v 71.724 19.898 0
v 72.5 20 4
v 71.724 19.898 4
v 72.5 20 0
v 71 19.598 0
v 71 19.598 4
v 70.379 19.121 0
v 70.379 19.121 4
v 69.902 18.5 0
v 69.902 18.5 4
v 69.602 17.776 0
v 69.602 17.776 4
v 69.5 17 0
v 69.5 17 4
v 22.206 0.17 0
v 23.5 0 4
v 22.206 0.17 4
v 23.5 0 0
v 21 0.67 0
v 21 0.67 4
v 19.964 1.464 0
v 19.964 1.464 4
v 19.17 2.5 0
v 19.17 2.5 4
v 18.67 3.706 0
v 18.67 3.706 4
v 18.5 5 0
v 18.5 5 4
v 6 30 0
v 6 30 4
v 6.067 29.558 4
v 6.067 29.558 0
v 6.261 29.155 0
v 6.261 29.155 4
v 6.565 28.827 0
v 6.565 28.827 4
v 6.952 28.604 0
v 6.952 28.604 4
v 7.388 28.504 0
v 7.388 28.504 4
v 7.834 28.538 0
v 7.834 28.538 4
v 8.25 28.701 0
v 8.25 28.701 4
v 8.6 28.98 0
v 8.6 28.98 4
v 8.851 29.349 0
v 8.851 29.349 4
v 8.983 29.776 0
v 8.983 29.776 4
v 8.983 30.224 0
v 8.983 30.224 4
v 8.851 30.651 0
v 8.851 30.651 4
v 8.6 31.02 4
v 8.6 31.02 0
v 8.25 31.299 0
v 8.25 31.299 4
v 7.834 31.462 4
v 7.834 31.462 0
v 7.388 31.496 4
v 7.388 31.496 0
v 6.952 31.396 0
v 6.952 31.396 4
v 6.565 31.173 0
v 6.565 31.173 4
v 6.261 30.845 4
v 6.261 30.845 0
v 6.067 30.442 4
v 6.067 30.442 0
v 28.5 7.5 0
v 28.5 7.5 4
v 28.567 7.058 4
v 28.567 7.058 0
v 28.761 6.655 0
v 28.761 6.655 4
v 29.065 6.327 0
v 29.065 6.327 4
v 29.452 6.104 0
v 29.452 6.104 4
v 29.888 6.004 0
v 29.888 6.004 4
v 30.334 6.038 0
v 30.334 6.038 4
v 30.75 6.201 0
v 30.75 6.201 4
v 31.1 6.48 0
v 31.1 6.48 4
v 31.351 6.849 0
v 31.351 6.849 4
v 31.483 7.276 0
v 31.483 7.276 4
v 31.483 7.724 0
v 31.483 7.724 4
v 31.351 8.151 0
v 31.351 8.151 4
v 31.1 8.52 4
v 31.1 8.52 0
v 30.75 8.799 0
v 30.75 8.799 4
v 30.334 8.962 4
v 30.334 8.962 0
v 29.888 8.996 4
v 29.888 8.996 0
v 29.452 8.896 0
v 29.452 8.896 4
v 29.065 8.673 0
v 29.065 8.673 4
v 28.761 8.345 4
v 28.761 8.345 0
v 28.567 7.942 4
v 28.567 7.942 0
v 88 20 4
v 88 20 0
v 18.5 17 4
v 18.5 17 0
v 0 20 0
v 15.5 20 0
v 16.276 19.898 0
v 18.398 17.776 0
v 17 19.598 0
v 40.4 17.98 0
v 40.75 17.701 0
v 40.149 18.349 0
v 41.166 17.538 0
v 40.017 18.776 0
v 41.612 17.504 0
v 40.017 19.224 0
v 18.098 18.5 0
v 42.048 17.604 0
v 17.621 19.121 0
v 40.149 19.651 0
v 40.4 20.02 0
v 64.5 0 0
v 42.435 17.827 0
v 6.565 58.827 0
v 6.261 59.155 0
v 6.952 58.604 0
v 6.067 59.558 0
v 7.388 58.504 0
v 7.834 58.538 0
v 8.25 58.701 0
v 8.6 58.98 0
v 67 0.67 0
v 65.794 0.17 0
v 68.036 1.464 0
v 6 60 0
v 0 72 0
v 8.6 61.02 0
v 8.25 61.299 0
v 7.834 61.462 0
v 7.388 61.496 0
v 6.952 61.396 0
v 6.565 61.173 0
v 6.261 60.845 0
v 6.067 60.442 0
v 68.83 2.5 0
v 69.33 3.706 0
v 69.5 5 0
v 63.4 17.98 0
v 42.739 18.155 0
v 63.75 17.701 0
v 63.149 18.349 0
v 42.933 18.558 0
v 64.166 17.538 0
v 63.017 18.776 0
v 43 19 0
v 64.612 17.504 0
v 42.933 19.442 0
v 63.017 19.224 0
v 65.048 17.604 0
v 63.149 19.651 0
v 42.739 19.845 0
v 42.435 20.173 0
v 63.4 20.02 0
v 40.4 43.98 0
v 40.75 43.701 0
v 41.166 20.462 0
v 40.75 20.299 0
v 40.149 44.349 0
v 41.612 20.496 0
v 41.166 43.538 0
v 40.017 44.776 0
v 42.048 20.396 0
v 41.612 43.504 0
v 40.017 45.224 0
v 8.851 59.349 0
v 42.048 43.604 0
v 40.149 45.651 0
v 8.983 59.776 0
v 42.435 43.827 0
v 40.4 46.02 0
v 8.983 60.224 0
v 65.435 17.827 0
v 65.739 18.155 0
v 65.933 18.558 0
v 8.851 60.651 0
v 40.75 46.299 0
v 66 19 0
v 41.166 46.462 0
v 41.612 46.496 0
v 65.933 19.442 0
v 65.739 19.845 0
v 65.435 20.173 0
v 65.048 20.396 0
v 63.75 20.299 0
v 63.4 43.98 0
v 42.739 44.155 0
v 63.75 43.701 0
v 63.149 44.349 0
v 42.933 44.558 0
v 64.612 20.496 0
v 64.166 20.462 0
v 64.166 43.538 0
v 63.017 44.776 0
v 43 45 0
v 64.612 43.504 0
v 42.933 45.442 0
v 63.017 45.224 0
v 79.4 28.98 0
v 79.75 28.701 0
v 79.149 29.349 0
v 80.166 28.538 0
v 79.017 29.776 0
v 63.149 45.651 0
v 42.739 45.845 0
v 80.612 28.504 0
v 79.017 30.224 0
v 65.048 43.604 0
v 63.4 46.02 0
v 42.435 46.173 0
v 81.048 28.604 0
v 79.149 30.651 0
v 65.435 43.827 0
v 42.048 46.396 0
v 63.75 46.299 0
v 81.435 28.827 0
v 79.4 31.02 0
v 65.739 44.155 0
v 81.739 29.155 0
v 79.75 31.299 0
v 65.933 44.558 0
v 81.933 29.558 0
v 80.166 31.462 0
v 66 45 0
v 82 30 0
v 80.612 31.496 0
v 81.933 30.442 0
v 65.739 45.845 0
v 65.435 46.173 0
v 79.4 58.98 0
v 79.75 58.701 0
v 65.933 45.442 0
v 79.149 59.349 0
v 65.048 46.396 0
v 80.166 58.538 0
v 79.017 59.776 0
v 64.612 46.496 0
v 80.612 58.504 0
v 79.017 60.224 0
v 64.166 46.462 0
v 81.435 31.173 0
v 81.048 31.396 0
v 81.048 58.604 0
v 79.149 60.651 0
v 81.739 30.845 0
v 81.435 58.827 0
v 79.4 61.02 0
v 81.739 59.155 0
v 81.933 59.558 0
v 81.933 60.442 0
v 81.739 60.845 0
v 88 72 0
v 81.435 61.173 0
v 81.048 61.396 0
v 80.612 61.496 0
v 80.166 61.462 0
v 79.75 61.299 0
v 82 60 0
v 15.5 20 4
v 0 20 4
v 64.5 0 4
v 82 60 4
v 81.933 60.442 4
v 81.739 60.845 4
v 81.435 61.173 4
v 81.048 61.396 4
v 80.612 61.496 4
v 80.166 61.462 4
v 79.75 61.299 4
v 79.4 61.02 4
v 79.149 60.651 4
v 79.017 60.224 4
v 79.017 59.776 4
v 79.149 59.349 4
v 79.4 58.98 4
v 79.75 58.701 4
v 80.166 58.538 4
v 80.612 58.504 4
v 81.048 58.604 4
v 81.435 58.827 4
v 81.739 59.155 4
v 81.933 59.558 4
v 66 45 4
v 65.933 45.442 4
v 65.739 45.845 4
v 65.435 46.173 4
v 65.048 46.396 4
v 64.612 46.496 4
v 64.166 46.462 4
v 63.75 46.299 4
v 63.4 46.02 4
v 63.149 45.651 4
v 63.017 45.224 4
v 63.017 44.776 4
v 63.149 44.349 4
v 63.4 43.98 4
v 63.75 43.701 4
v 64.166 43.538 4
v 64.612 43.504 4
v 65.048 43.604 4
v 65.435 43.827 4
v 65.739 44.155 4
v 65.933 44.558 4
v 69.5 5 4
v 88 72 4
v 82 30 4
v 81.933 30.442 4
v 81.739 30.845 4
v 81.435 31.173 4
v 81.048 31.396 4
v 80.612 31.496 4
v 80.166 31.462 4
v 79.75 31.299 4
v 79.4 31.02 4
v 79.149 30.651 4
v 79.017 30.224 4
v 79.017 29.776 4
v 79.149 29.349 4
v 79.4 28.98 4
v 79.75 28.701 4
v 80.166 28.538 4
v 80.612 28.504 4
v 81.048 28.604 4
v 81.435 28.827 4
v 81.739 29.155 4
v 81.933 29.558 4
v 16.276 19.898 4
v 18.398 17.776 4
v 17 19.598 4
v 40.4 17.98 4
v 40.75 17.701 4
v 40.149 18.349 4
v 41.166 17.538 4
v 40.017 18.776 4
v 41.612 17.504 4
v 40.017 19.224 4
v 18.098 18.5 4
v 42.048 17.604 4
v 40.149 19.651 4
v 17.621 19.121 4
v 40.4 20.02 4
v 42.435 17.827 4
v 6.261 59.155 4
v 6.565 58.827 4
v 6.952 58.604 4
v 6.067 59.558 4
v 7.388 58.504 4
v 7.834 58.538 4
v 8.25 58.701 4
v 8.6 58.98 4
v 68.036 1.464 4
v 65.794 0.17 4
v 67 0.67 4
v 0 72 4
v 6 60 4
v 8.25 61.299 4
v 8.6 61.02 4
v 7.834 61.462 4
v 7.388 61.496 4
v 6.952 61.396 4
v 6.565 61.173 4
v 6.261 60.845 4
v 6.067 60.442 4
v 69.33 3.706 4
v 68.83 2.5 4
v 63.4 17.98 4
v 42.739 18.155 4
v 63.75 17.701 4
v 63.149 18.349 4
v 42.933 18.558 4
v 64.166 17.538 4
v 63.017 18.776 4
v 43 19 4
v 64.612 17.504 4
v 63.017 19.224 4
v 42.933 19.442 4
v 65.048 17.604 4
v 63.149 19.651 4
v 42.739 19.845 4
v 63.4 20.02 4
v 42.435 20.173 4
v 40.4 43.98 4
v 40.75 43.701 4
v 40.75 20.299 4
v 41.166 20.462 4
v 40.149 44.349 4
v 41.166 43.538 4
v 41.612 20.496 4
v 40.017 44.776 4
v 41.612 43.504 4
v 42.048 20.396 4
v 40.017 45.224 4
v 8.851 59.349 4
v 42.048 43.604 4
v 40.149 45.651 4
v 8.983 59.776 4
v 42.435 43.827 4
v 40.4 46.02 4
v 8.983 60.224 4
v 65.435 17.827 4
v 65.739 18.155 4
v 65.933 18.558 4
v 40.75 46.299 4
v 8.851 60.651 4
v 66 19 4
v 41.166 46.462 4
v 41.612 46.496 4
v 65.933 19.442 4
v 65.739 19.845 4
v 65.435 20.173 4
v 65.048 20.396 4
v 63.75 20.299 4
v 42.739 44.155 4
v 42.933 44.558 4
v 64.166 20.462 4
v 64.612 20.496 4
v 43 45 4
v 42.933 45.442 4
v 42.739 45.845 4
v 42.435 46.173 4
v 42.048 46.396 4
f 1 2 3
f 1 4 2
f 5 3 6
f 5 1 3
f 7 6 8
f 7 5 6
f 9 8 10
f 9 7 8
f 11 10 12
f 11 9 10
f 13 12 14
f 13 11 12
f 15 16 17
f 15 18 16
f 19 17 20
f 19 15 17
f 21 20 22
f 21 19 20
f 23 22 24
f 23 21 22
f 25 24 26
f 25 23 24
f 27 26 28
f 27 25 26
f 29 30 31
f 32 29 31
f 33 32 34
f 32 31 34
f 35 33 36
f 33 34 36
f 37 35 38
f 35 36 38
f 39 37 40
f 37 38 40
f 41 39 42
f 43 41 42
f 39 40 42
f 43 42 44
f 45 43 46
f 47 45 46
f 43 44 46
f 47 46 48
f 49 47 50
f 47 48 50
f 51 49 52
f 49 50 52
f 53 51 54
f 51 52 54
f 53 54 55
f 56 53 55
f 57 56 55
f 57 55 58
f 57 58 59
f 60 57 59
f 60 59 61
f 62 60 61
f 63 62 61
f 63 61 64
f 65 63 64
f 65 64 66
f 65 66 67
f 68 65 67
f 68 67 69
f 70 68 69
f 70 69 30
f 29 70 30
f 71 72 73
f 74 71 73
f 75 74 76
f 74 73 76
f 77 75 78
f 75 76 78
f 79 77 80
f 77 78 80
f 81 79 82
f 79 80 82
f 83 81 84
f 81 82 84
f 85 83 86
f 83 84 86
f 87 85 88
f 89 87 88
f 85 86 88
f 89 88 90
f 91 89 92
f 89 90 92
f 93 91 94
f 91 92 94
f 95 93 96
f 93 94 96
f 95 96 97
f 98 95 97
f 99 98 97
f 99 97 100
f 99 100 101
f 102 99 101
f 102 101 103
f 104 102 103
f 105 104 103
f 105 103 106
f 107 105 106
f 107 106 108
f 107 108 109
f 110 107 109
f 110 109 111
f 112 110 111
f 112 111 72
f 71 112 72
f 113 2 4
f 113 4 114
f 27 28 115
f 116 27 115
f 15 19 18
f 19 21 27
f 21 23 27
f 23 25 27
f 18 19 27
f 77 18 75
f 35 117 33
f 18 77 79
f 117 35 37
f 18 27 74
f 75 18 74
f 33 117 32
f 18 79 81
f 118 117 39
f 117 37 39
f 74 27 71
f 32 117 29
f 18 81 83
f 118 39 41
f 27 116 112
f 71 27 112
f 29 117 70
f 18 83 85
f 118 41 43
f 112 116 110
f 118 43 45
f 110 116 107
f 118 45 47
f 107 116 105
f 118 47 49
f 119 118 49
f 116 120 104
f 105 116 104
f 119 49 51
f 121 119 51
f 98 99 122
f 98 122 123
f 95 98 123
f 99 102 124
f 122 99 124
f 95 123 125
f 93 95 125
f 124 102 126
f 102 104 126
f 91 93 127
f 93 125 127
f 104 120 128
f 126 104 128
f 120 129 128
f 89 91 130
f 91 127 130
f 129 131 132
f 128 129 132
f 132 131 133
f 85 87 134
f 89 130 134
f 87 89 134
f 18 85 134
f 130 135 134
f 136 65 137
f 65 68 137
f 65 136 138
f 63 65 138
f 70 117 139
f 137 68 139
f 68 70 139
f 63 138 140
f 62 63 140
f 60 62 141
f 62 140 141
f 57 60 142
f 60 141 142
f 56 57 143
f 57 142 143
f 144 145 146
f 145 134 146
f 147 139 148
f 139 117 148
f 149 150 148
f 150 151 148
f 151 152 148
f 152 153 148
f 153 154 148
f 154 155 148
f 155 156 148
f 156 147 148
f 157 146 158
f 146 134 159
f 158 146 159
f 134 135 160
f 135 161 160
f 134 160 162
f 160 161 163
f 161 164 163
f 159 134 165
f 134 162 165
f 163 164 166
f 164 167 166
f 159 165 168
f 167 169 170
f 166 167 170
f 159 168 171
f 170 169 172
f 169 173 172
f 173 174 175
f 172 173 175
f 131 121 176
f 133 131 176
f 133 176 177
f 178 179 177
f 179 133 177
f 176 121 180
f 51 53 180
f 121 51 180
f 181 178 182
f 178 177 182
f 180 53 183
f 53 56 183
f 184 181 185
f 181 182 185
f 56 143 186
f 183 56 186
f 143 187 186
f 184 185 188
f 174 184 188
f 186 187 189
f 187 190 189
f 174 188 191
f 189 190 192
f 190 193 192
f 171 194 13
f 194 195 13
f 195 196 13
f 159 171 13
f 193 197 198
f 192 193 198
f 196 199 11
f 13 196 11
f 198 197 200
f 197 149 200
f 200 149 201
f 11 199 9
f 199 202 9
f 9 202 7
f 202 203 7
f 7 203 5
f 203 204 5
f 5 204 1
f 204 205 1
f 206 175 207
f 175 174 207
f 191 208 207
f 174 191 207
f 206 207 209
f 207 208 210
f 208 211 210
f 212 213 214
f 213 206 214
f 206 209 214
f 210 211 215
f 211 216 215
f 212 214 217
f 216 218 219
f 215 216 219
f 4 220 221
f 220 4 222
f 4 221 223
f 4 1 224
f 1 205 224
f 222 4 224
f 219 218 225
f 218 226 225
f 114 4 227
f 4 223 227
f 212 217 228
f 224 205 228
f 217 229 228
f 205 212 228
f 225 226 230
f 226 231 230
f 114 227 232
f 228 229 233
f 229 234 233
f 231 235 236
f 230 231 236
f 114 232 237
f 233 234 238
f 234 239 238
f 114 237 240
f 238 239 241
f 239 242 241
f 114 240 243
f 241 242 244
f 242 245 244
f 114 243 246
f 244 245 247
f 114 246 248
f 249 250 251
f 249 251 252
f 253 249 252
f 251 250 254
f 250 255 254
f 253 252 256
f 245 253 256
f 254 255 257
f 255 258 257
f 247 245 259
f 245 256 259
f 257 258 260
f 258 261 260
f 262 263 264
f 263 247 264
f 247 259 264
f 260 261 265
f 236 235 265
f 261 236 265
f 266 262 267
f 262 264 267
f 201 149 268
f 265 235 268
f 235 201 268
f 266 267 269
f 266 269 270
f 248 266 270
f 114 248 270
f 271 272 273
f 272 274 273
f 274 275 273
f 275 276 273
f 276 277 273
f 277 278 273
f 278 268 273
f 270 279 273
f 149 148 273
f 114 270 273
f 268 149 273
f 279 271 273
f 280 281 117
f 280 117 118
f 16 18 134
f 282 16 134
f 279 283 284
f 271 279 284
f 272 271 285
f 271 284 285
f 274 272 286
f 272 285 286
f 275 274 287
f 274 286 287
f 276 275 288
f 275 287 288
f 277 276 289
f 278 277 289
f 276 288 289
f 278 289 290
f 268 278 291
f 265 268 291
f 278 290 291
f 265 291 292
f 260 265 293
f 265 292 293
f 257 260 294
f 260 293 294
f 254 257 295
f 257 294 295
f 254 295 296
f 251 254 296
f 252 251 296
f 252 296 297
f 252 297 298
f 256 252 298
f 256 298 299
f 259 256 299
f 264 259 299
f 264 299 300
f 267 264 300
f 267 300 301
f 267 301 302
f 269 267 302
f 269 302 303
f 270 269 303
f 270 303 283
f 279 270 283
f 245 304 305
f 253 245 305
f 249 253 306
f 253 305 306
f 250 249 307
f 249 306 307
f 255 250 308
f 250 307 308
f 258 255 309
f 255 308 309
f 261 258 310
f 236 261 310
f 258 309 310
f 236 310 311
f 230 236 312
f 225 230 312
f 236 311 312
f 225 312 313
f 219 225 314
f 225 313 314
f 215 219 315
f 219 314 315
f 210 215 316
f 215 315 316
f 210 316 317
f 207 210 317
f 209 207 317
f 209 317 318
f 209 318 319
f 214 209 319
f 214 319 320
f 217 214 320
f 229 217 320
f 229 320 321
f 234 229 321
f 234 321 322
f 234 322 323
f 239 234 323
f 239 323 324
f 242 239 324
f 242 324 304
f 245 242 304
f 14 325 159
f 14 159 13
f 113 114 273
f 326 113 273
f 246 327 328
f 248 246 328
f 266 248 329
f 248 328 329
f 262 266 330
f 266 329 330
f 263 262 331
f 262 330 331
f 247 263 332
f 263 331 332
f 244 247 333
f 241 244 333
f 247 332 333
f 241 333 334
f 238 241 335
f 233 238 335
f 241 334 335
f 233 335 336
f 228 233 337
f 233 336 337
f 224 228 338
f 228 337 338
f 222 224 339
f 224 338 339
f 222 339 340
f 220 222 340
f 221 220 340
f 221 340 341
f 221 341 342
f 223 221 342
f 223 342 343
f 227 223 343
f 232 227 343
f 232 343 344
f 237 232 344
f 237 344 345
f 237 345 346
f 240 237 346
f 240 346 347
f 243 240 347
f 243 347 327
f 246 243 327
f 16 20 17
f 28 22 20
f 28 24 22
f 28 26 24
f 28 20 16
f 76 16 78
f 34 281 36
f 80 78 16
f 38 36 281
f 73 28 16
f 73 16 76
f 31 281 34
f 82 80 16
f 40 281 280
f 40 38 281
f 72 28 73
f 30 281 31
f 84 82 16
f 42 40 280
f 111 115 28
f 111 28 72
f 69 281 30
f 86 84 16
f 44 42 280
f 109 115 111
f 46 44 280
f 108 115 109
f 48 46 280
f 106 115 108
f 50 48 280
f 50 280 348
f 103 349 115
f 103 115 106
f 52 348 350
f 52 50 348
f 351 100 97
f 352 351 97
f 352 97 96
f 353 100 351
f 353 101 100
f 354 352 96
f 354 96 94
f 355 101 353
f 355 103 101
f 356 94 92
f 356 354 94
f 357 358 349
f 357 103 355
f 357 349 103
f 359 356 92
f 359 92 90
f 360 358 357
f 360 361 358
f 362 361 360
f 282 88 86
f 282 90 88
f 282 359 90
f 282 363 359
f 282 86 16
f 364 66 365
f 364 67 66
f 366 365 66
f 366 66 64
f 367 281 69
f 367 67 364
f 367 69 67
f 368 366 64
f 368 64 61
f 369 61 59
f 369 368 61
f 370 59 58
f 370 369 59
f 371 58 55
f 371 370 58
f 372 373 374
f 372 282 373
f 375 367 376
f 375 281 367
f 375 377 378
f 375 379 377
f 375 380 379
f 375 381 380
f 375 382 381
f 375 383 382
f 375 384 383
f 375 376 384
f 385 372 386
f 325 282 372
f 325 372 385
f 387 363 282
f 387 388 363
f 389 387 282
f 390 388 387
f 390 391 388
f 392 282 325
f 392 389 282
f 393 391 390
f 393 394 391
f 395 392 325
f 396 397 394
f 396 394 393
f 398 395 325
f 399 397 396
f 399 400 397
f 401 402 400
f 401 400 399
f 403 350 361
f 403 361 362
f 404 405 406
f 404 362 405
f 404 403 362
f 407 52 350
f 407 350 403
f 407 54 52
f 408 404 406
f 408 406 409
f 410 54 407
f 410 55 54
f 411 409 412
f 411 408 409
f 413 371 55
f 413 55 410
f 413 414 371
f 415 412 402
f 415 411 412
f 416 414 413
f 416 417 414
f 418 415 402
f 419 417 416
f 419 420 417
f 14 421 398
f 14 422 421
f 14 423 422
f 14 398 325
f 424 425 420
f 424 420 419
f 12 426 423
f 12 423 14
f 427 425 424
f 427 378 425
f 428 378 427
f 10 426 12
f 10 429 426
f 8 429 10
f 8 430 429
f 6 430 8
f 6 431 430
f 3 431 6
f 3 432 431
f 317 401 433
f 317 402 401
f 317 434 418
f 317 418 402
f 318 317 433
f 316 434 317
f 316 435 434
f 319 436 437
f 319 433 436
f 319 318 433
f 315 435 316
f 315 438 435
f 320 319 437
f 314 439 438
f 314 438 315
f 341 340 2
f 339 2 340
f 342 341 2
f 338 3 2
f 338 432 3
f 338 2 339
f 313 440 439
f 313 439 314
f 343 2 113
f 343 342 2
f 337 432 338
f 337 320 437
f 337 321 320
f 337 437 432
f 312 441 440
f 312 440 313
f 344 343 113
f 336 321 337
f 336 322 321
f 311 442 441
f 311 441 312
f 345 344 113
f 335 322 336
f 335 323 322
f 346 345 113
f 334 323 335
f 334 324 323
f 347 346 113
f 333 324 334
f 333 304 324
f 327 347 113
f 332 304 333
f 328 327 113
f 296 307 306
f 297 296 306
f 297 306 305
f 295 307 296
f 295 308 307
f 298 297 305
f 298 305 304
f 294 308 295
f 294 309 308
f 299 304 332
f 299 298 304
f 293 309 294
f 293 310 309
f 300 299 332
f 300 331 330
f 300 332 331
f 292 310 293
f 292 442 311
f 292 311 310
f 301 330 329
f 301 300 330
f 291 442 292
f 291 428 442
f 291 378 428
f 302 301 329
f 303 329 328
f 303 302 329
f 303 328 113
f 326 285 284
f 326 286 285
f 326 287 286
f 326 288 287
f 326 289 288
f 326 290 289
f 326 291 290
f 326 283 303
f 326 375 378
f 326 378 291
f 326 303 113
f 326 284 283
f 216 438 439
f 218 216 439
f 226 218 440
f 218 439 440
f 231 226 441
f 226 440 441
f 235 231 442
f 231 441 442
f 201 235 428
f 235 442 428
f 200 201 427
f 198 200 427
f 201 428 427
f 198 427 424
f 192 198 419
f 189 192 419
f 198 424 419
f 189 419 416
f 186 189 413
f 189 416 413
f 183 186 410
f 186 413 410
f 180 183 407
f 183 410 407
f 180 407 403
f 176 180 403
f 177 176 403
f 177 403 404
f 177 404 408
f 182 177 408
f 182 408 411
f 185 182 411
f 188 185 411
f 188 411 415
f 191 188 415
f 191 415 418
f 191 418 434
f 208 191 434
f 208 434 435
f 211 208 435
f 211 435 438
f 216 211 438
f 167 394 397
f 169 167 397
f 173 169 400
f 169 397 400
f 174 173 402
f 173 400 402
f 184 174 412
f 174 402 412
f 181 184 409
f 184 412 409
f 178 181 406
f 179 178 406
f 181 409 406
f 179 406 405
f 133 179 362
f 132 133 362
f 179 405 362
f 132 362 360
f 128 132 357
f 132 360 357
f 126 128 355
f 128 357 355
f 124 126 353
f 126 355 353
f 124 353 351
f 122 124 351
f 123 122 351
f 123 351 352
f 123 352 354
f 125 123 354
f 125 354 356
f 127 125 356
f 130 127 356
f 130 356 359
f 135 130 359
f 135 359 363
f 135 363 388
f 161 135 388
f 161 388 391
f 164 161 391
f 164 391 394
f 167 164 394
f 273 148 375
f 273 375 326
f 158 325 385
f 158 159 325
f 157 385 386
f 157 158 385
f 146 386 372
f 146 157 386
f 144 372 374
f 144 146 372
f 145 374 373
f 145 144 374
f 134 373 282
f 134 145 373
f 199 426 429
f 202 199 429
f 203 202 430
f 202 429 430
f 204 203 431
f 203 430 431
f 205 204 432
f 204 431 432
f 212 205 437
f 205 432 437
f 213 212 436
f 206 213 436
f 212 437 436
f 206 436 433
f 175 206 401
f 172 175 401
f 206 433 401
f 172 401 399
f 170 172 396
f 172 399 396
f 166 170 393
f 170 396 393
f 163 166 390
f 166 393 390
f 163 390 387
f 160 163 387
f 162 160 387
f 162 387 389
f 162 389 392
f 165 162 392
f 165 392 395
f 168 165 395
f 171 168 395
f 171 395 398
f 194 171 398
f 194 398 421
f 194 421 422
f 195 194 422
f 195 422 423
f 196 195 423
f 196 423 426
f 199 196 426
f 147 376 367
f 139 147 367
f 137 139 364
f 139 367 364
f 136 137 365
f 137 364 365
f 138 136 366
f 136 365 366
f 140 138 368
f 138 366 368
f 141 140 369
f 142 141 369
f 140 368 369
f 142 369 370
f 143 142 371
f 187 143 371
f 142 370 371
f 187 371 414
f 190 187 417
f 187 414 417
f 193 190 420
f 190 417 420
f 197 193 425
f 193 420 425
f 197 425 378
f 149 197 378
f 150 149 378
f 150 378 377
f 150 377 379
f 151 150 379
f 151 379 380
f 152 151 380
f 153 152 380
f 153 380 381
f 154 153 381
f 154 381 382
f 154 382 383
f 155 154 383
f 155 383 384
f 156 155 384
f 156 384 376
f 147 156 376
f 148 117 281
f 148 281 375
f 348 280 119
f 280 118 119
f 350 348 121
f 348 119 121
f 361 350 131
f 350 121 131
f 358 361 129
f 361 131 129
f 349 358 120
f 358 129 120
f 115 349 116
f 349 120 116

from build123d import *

# Parameters (mm, degrees)
SKETCH_1_W          = 88
SKETCH_1_H          = 72
EXTRUDE_1_DEPTH     = 4
SKETCH_2_W          = 18.5
SKETCH_2_H          = 20
CUT_EXTRUDE_1_DEPTH = 114.771701227
FILLET_1_R          = 3
SKETCH_3_W          = 18.5
SKETCH_3_H          = 20
CUT_EXTRUDE_2_DEPTH = 114.771701227
FILLET_2_R          = 3
SKETCH_5_R          = 1.5
CUT_EXTRUDE_4_DEPTH = 114.771701227
SKETCH_4_R          = 1.5
CUT_EXTRUDE_3_DEPTH = 114.771701227
FILLET_4_R          = 5


with BuildPart() as part:
    # 草图1 → 凸台-拉伸1 (new body)
    with BuildSketch(Plane.XY):
        with Locations((44, 36)):
            Rectangle(SKETCH_1_W, SKETCH_1_H)
    extrude(amount=EXTRUDE_1_DEPTH)

    # 草图2 → 切除-拉伸1 (cut, through all)
    with BuildSketch(Plane.XY.offset(4)):
        with Locations((9.25, 10)):
            Rectangle(SKETCH_2_W, SKETCH_2_H)
    extrude(amount=-CUT_EXTRUDE_1_DEPTH, mode=Mode.SUBTRACT)

    # 圆角1
    fillet_1_edges = [part.edges().sort_by_distance(p)[0] for p in [
        (18.5, 20, 2),
    ]]
    fillet(fillet_1_edges, radius=FILLET_1_R)

    # 草图3 → 切除-拉伸2 (cut, through all)
    with BuildSketch(Plane.XY.offset(4)):
        with Locations((78.75, 10)):
            Rectangle(SKETCH_3_W, SKETCH_3_H)
    extrude(amount=-CUT_EXTRUDE_2_DEPTH, mode=Mode.SUBTRACT)

    # 圆角2
    fillet_2_edges = [part.edges().sort_by_distance(p)[0] for p in [
        (69.5, 20, 2),
    ]]
    fillet(fillet_2_edges, radius=FILLET_2_R)

    # 草图5 → 切除-拉伸4 (cut, through all)
    with BuildSketch(Plane.XY.offset(4)):
        with Locations((80.5, 60)):
            Circle(SKETCH_5_R)
        with Locations((80.5, 30)):
            Circle(SKETCH_5_R)
        with Locations(Location((30, 7.5, 0), (0, 0, 180))):
            Circle(SKETCH_5_R)
        with Locations(Location((7.5, 30, 0), (0, 0, 180))):
            Circle(SKETCH_5_R)
        with Locations(Location((7.5, 60, 0), (0, 0, 180))):
            Circle(SKETCH_5_R)
    extrude(amount=-CUT_EXTRUDE_4_DEPTH, mode=Mode.SUBTRACT)

    # 草图4 → 切除-拉伸3 (cut, through all)
    with BuildSketch(Plane.XY.offset(4)):
        with Locations((41.5, 45)):
            Circle(SKETCH_4_R)
        with Locations((64.5, 45)):
            Circle(SKETCH_4_R)
        with Locations((64.5, 19)):
            Circle(SKETCH_4_R)
        with Locations((41.5, 19)):
            Circle(SKETCH_4_R)
    extrude(amount=-CUT_EXTRUDE_3_DEPTH, mode=Mode.SUBTRACT)

    # 圆角4
    fillet_4_edges = [part.edges().sort_by_distance(p)[0] for p in [
        (18.5, 0, 2),
        (69.5, 0, 2),
    ]]
    fillet(fillet_4_edges, radius=FILLET_4_R)


solid = part.part
